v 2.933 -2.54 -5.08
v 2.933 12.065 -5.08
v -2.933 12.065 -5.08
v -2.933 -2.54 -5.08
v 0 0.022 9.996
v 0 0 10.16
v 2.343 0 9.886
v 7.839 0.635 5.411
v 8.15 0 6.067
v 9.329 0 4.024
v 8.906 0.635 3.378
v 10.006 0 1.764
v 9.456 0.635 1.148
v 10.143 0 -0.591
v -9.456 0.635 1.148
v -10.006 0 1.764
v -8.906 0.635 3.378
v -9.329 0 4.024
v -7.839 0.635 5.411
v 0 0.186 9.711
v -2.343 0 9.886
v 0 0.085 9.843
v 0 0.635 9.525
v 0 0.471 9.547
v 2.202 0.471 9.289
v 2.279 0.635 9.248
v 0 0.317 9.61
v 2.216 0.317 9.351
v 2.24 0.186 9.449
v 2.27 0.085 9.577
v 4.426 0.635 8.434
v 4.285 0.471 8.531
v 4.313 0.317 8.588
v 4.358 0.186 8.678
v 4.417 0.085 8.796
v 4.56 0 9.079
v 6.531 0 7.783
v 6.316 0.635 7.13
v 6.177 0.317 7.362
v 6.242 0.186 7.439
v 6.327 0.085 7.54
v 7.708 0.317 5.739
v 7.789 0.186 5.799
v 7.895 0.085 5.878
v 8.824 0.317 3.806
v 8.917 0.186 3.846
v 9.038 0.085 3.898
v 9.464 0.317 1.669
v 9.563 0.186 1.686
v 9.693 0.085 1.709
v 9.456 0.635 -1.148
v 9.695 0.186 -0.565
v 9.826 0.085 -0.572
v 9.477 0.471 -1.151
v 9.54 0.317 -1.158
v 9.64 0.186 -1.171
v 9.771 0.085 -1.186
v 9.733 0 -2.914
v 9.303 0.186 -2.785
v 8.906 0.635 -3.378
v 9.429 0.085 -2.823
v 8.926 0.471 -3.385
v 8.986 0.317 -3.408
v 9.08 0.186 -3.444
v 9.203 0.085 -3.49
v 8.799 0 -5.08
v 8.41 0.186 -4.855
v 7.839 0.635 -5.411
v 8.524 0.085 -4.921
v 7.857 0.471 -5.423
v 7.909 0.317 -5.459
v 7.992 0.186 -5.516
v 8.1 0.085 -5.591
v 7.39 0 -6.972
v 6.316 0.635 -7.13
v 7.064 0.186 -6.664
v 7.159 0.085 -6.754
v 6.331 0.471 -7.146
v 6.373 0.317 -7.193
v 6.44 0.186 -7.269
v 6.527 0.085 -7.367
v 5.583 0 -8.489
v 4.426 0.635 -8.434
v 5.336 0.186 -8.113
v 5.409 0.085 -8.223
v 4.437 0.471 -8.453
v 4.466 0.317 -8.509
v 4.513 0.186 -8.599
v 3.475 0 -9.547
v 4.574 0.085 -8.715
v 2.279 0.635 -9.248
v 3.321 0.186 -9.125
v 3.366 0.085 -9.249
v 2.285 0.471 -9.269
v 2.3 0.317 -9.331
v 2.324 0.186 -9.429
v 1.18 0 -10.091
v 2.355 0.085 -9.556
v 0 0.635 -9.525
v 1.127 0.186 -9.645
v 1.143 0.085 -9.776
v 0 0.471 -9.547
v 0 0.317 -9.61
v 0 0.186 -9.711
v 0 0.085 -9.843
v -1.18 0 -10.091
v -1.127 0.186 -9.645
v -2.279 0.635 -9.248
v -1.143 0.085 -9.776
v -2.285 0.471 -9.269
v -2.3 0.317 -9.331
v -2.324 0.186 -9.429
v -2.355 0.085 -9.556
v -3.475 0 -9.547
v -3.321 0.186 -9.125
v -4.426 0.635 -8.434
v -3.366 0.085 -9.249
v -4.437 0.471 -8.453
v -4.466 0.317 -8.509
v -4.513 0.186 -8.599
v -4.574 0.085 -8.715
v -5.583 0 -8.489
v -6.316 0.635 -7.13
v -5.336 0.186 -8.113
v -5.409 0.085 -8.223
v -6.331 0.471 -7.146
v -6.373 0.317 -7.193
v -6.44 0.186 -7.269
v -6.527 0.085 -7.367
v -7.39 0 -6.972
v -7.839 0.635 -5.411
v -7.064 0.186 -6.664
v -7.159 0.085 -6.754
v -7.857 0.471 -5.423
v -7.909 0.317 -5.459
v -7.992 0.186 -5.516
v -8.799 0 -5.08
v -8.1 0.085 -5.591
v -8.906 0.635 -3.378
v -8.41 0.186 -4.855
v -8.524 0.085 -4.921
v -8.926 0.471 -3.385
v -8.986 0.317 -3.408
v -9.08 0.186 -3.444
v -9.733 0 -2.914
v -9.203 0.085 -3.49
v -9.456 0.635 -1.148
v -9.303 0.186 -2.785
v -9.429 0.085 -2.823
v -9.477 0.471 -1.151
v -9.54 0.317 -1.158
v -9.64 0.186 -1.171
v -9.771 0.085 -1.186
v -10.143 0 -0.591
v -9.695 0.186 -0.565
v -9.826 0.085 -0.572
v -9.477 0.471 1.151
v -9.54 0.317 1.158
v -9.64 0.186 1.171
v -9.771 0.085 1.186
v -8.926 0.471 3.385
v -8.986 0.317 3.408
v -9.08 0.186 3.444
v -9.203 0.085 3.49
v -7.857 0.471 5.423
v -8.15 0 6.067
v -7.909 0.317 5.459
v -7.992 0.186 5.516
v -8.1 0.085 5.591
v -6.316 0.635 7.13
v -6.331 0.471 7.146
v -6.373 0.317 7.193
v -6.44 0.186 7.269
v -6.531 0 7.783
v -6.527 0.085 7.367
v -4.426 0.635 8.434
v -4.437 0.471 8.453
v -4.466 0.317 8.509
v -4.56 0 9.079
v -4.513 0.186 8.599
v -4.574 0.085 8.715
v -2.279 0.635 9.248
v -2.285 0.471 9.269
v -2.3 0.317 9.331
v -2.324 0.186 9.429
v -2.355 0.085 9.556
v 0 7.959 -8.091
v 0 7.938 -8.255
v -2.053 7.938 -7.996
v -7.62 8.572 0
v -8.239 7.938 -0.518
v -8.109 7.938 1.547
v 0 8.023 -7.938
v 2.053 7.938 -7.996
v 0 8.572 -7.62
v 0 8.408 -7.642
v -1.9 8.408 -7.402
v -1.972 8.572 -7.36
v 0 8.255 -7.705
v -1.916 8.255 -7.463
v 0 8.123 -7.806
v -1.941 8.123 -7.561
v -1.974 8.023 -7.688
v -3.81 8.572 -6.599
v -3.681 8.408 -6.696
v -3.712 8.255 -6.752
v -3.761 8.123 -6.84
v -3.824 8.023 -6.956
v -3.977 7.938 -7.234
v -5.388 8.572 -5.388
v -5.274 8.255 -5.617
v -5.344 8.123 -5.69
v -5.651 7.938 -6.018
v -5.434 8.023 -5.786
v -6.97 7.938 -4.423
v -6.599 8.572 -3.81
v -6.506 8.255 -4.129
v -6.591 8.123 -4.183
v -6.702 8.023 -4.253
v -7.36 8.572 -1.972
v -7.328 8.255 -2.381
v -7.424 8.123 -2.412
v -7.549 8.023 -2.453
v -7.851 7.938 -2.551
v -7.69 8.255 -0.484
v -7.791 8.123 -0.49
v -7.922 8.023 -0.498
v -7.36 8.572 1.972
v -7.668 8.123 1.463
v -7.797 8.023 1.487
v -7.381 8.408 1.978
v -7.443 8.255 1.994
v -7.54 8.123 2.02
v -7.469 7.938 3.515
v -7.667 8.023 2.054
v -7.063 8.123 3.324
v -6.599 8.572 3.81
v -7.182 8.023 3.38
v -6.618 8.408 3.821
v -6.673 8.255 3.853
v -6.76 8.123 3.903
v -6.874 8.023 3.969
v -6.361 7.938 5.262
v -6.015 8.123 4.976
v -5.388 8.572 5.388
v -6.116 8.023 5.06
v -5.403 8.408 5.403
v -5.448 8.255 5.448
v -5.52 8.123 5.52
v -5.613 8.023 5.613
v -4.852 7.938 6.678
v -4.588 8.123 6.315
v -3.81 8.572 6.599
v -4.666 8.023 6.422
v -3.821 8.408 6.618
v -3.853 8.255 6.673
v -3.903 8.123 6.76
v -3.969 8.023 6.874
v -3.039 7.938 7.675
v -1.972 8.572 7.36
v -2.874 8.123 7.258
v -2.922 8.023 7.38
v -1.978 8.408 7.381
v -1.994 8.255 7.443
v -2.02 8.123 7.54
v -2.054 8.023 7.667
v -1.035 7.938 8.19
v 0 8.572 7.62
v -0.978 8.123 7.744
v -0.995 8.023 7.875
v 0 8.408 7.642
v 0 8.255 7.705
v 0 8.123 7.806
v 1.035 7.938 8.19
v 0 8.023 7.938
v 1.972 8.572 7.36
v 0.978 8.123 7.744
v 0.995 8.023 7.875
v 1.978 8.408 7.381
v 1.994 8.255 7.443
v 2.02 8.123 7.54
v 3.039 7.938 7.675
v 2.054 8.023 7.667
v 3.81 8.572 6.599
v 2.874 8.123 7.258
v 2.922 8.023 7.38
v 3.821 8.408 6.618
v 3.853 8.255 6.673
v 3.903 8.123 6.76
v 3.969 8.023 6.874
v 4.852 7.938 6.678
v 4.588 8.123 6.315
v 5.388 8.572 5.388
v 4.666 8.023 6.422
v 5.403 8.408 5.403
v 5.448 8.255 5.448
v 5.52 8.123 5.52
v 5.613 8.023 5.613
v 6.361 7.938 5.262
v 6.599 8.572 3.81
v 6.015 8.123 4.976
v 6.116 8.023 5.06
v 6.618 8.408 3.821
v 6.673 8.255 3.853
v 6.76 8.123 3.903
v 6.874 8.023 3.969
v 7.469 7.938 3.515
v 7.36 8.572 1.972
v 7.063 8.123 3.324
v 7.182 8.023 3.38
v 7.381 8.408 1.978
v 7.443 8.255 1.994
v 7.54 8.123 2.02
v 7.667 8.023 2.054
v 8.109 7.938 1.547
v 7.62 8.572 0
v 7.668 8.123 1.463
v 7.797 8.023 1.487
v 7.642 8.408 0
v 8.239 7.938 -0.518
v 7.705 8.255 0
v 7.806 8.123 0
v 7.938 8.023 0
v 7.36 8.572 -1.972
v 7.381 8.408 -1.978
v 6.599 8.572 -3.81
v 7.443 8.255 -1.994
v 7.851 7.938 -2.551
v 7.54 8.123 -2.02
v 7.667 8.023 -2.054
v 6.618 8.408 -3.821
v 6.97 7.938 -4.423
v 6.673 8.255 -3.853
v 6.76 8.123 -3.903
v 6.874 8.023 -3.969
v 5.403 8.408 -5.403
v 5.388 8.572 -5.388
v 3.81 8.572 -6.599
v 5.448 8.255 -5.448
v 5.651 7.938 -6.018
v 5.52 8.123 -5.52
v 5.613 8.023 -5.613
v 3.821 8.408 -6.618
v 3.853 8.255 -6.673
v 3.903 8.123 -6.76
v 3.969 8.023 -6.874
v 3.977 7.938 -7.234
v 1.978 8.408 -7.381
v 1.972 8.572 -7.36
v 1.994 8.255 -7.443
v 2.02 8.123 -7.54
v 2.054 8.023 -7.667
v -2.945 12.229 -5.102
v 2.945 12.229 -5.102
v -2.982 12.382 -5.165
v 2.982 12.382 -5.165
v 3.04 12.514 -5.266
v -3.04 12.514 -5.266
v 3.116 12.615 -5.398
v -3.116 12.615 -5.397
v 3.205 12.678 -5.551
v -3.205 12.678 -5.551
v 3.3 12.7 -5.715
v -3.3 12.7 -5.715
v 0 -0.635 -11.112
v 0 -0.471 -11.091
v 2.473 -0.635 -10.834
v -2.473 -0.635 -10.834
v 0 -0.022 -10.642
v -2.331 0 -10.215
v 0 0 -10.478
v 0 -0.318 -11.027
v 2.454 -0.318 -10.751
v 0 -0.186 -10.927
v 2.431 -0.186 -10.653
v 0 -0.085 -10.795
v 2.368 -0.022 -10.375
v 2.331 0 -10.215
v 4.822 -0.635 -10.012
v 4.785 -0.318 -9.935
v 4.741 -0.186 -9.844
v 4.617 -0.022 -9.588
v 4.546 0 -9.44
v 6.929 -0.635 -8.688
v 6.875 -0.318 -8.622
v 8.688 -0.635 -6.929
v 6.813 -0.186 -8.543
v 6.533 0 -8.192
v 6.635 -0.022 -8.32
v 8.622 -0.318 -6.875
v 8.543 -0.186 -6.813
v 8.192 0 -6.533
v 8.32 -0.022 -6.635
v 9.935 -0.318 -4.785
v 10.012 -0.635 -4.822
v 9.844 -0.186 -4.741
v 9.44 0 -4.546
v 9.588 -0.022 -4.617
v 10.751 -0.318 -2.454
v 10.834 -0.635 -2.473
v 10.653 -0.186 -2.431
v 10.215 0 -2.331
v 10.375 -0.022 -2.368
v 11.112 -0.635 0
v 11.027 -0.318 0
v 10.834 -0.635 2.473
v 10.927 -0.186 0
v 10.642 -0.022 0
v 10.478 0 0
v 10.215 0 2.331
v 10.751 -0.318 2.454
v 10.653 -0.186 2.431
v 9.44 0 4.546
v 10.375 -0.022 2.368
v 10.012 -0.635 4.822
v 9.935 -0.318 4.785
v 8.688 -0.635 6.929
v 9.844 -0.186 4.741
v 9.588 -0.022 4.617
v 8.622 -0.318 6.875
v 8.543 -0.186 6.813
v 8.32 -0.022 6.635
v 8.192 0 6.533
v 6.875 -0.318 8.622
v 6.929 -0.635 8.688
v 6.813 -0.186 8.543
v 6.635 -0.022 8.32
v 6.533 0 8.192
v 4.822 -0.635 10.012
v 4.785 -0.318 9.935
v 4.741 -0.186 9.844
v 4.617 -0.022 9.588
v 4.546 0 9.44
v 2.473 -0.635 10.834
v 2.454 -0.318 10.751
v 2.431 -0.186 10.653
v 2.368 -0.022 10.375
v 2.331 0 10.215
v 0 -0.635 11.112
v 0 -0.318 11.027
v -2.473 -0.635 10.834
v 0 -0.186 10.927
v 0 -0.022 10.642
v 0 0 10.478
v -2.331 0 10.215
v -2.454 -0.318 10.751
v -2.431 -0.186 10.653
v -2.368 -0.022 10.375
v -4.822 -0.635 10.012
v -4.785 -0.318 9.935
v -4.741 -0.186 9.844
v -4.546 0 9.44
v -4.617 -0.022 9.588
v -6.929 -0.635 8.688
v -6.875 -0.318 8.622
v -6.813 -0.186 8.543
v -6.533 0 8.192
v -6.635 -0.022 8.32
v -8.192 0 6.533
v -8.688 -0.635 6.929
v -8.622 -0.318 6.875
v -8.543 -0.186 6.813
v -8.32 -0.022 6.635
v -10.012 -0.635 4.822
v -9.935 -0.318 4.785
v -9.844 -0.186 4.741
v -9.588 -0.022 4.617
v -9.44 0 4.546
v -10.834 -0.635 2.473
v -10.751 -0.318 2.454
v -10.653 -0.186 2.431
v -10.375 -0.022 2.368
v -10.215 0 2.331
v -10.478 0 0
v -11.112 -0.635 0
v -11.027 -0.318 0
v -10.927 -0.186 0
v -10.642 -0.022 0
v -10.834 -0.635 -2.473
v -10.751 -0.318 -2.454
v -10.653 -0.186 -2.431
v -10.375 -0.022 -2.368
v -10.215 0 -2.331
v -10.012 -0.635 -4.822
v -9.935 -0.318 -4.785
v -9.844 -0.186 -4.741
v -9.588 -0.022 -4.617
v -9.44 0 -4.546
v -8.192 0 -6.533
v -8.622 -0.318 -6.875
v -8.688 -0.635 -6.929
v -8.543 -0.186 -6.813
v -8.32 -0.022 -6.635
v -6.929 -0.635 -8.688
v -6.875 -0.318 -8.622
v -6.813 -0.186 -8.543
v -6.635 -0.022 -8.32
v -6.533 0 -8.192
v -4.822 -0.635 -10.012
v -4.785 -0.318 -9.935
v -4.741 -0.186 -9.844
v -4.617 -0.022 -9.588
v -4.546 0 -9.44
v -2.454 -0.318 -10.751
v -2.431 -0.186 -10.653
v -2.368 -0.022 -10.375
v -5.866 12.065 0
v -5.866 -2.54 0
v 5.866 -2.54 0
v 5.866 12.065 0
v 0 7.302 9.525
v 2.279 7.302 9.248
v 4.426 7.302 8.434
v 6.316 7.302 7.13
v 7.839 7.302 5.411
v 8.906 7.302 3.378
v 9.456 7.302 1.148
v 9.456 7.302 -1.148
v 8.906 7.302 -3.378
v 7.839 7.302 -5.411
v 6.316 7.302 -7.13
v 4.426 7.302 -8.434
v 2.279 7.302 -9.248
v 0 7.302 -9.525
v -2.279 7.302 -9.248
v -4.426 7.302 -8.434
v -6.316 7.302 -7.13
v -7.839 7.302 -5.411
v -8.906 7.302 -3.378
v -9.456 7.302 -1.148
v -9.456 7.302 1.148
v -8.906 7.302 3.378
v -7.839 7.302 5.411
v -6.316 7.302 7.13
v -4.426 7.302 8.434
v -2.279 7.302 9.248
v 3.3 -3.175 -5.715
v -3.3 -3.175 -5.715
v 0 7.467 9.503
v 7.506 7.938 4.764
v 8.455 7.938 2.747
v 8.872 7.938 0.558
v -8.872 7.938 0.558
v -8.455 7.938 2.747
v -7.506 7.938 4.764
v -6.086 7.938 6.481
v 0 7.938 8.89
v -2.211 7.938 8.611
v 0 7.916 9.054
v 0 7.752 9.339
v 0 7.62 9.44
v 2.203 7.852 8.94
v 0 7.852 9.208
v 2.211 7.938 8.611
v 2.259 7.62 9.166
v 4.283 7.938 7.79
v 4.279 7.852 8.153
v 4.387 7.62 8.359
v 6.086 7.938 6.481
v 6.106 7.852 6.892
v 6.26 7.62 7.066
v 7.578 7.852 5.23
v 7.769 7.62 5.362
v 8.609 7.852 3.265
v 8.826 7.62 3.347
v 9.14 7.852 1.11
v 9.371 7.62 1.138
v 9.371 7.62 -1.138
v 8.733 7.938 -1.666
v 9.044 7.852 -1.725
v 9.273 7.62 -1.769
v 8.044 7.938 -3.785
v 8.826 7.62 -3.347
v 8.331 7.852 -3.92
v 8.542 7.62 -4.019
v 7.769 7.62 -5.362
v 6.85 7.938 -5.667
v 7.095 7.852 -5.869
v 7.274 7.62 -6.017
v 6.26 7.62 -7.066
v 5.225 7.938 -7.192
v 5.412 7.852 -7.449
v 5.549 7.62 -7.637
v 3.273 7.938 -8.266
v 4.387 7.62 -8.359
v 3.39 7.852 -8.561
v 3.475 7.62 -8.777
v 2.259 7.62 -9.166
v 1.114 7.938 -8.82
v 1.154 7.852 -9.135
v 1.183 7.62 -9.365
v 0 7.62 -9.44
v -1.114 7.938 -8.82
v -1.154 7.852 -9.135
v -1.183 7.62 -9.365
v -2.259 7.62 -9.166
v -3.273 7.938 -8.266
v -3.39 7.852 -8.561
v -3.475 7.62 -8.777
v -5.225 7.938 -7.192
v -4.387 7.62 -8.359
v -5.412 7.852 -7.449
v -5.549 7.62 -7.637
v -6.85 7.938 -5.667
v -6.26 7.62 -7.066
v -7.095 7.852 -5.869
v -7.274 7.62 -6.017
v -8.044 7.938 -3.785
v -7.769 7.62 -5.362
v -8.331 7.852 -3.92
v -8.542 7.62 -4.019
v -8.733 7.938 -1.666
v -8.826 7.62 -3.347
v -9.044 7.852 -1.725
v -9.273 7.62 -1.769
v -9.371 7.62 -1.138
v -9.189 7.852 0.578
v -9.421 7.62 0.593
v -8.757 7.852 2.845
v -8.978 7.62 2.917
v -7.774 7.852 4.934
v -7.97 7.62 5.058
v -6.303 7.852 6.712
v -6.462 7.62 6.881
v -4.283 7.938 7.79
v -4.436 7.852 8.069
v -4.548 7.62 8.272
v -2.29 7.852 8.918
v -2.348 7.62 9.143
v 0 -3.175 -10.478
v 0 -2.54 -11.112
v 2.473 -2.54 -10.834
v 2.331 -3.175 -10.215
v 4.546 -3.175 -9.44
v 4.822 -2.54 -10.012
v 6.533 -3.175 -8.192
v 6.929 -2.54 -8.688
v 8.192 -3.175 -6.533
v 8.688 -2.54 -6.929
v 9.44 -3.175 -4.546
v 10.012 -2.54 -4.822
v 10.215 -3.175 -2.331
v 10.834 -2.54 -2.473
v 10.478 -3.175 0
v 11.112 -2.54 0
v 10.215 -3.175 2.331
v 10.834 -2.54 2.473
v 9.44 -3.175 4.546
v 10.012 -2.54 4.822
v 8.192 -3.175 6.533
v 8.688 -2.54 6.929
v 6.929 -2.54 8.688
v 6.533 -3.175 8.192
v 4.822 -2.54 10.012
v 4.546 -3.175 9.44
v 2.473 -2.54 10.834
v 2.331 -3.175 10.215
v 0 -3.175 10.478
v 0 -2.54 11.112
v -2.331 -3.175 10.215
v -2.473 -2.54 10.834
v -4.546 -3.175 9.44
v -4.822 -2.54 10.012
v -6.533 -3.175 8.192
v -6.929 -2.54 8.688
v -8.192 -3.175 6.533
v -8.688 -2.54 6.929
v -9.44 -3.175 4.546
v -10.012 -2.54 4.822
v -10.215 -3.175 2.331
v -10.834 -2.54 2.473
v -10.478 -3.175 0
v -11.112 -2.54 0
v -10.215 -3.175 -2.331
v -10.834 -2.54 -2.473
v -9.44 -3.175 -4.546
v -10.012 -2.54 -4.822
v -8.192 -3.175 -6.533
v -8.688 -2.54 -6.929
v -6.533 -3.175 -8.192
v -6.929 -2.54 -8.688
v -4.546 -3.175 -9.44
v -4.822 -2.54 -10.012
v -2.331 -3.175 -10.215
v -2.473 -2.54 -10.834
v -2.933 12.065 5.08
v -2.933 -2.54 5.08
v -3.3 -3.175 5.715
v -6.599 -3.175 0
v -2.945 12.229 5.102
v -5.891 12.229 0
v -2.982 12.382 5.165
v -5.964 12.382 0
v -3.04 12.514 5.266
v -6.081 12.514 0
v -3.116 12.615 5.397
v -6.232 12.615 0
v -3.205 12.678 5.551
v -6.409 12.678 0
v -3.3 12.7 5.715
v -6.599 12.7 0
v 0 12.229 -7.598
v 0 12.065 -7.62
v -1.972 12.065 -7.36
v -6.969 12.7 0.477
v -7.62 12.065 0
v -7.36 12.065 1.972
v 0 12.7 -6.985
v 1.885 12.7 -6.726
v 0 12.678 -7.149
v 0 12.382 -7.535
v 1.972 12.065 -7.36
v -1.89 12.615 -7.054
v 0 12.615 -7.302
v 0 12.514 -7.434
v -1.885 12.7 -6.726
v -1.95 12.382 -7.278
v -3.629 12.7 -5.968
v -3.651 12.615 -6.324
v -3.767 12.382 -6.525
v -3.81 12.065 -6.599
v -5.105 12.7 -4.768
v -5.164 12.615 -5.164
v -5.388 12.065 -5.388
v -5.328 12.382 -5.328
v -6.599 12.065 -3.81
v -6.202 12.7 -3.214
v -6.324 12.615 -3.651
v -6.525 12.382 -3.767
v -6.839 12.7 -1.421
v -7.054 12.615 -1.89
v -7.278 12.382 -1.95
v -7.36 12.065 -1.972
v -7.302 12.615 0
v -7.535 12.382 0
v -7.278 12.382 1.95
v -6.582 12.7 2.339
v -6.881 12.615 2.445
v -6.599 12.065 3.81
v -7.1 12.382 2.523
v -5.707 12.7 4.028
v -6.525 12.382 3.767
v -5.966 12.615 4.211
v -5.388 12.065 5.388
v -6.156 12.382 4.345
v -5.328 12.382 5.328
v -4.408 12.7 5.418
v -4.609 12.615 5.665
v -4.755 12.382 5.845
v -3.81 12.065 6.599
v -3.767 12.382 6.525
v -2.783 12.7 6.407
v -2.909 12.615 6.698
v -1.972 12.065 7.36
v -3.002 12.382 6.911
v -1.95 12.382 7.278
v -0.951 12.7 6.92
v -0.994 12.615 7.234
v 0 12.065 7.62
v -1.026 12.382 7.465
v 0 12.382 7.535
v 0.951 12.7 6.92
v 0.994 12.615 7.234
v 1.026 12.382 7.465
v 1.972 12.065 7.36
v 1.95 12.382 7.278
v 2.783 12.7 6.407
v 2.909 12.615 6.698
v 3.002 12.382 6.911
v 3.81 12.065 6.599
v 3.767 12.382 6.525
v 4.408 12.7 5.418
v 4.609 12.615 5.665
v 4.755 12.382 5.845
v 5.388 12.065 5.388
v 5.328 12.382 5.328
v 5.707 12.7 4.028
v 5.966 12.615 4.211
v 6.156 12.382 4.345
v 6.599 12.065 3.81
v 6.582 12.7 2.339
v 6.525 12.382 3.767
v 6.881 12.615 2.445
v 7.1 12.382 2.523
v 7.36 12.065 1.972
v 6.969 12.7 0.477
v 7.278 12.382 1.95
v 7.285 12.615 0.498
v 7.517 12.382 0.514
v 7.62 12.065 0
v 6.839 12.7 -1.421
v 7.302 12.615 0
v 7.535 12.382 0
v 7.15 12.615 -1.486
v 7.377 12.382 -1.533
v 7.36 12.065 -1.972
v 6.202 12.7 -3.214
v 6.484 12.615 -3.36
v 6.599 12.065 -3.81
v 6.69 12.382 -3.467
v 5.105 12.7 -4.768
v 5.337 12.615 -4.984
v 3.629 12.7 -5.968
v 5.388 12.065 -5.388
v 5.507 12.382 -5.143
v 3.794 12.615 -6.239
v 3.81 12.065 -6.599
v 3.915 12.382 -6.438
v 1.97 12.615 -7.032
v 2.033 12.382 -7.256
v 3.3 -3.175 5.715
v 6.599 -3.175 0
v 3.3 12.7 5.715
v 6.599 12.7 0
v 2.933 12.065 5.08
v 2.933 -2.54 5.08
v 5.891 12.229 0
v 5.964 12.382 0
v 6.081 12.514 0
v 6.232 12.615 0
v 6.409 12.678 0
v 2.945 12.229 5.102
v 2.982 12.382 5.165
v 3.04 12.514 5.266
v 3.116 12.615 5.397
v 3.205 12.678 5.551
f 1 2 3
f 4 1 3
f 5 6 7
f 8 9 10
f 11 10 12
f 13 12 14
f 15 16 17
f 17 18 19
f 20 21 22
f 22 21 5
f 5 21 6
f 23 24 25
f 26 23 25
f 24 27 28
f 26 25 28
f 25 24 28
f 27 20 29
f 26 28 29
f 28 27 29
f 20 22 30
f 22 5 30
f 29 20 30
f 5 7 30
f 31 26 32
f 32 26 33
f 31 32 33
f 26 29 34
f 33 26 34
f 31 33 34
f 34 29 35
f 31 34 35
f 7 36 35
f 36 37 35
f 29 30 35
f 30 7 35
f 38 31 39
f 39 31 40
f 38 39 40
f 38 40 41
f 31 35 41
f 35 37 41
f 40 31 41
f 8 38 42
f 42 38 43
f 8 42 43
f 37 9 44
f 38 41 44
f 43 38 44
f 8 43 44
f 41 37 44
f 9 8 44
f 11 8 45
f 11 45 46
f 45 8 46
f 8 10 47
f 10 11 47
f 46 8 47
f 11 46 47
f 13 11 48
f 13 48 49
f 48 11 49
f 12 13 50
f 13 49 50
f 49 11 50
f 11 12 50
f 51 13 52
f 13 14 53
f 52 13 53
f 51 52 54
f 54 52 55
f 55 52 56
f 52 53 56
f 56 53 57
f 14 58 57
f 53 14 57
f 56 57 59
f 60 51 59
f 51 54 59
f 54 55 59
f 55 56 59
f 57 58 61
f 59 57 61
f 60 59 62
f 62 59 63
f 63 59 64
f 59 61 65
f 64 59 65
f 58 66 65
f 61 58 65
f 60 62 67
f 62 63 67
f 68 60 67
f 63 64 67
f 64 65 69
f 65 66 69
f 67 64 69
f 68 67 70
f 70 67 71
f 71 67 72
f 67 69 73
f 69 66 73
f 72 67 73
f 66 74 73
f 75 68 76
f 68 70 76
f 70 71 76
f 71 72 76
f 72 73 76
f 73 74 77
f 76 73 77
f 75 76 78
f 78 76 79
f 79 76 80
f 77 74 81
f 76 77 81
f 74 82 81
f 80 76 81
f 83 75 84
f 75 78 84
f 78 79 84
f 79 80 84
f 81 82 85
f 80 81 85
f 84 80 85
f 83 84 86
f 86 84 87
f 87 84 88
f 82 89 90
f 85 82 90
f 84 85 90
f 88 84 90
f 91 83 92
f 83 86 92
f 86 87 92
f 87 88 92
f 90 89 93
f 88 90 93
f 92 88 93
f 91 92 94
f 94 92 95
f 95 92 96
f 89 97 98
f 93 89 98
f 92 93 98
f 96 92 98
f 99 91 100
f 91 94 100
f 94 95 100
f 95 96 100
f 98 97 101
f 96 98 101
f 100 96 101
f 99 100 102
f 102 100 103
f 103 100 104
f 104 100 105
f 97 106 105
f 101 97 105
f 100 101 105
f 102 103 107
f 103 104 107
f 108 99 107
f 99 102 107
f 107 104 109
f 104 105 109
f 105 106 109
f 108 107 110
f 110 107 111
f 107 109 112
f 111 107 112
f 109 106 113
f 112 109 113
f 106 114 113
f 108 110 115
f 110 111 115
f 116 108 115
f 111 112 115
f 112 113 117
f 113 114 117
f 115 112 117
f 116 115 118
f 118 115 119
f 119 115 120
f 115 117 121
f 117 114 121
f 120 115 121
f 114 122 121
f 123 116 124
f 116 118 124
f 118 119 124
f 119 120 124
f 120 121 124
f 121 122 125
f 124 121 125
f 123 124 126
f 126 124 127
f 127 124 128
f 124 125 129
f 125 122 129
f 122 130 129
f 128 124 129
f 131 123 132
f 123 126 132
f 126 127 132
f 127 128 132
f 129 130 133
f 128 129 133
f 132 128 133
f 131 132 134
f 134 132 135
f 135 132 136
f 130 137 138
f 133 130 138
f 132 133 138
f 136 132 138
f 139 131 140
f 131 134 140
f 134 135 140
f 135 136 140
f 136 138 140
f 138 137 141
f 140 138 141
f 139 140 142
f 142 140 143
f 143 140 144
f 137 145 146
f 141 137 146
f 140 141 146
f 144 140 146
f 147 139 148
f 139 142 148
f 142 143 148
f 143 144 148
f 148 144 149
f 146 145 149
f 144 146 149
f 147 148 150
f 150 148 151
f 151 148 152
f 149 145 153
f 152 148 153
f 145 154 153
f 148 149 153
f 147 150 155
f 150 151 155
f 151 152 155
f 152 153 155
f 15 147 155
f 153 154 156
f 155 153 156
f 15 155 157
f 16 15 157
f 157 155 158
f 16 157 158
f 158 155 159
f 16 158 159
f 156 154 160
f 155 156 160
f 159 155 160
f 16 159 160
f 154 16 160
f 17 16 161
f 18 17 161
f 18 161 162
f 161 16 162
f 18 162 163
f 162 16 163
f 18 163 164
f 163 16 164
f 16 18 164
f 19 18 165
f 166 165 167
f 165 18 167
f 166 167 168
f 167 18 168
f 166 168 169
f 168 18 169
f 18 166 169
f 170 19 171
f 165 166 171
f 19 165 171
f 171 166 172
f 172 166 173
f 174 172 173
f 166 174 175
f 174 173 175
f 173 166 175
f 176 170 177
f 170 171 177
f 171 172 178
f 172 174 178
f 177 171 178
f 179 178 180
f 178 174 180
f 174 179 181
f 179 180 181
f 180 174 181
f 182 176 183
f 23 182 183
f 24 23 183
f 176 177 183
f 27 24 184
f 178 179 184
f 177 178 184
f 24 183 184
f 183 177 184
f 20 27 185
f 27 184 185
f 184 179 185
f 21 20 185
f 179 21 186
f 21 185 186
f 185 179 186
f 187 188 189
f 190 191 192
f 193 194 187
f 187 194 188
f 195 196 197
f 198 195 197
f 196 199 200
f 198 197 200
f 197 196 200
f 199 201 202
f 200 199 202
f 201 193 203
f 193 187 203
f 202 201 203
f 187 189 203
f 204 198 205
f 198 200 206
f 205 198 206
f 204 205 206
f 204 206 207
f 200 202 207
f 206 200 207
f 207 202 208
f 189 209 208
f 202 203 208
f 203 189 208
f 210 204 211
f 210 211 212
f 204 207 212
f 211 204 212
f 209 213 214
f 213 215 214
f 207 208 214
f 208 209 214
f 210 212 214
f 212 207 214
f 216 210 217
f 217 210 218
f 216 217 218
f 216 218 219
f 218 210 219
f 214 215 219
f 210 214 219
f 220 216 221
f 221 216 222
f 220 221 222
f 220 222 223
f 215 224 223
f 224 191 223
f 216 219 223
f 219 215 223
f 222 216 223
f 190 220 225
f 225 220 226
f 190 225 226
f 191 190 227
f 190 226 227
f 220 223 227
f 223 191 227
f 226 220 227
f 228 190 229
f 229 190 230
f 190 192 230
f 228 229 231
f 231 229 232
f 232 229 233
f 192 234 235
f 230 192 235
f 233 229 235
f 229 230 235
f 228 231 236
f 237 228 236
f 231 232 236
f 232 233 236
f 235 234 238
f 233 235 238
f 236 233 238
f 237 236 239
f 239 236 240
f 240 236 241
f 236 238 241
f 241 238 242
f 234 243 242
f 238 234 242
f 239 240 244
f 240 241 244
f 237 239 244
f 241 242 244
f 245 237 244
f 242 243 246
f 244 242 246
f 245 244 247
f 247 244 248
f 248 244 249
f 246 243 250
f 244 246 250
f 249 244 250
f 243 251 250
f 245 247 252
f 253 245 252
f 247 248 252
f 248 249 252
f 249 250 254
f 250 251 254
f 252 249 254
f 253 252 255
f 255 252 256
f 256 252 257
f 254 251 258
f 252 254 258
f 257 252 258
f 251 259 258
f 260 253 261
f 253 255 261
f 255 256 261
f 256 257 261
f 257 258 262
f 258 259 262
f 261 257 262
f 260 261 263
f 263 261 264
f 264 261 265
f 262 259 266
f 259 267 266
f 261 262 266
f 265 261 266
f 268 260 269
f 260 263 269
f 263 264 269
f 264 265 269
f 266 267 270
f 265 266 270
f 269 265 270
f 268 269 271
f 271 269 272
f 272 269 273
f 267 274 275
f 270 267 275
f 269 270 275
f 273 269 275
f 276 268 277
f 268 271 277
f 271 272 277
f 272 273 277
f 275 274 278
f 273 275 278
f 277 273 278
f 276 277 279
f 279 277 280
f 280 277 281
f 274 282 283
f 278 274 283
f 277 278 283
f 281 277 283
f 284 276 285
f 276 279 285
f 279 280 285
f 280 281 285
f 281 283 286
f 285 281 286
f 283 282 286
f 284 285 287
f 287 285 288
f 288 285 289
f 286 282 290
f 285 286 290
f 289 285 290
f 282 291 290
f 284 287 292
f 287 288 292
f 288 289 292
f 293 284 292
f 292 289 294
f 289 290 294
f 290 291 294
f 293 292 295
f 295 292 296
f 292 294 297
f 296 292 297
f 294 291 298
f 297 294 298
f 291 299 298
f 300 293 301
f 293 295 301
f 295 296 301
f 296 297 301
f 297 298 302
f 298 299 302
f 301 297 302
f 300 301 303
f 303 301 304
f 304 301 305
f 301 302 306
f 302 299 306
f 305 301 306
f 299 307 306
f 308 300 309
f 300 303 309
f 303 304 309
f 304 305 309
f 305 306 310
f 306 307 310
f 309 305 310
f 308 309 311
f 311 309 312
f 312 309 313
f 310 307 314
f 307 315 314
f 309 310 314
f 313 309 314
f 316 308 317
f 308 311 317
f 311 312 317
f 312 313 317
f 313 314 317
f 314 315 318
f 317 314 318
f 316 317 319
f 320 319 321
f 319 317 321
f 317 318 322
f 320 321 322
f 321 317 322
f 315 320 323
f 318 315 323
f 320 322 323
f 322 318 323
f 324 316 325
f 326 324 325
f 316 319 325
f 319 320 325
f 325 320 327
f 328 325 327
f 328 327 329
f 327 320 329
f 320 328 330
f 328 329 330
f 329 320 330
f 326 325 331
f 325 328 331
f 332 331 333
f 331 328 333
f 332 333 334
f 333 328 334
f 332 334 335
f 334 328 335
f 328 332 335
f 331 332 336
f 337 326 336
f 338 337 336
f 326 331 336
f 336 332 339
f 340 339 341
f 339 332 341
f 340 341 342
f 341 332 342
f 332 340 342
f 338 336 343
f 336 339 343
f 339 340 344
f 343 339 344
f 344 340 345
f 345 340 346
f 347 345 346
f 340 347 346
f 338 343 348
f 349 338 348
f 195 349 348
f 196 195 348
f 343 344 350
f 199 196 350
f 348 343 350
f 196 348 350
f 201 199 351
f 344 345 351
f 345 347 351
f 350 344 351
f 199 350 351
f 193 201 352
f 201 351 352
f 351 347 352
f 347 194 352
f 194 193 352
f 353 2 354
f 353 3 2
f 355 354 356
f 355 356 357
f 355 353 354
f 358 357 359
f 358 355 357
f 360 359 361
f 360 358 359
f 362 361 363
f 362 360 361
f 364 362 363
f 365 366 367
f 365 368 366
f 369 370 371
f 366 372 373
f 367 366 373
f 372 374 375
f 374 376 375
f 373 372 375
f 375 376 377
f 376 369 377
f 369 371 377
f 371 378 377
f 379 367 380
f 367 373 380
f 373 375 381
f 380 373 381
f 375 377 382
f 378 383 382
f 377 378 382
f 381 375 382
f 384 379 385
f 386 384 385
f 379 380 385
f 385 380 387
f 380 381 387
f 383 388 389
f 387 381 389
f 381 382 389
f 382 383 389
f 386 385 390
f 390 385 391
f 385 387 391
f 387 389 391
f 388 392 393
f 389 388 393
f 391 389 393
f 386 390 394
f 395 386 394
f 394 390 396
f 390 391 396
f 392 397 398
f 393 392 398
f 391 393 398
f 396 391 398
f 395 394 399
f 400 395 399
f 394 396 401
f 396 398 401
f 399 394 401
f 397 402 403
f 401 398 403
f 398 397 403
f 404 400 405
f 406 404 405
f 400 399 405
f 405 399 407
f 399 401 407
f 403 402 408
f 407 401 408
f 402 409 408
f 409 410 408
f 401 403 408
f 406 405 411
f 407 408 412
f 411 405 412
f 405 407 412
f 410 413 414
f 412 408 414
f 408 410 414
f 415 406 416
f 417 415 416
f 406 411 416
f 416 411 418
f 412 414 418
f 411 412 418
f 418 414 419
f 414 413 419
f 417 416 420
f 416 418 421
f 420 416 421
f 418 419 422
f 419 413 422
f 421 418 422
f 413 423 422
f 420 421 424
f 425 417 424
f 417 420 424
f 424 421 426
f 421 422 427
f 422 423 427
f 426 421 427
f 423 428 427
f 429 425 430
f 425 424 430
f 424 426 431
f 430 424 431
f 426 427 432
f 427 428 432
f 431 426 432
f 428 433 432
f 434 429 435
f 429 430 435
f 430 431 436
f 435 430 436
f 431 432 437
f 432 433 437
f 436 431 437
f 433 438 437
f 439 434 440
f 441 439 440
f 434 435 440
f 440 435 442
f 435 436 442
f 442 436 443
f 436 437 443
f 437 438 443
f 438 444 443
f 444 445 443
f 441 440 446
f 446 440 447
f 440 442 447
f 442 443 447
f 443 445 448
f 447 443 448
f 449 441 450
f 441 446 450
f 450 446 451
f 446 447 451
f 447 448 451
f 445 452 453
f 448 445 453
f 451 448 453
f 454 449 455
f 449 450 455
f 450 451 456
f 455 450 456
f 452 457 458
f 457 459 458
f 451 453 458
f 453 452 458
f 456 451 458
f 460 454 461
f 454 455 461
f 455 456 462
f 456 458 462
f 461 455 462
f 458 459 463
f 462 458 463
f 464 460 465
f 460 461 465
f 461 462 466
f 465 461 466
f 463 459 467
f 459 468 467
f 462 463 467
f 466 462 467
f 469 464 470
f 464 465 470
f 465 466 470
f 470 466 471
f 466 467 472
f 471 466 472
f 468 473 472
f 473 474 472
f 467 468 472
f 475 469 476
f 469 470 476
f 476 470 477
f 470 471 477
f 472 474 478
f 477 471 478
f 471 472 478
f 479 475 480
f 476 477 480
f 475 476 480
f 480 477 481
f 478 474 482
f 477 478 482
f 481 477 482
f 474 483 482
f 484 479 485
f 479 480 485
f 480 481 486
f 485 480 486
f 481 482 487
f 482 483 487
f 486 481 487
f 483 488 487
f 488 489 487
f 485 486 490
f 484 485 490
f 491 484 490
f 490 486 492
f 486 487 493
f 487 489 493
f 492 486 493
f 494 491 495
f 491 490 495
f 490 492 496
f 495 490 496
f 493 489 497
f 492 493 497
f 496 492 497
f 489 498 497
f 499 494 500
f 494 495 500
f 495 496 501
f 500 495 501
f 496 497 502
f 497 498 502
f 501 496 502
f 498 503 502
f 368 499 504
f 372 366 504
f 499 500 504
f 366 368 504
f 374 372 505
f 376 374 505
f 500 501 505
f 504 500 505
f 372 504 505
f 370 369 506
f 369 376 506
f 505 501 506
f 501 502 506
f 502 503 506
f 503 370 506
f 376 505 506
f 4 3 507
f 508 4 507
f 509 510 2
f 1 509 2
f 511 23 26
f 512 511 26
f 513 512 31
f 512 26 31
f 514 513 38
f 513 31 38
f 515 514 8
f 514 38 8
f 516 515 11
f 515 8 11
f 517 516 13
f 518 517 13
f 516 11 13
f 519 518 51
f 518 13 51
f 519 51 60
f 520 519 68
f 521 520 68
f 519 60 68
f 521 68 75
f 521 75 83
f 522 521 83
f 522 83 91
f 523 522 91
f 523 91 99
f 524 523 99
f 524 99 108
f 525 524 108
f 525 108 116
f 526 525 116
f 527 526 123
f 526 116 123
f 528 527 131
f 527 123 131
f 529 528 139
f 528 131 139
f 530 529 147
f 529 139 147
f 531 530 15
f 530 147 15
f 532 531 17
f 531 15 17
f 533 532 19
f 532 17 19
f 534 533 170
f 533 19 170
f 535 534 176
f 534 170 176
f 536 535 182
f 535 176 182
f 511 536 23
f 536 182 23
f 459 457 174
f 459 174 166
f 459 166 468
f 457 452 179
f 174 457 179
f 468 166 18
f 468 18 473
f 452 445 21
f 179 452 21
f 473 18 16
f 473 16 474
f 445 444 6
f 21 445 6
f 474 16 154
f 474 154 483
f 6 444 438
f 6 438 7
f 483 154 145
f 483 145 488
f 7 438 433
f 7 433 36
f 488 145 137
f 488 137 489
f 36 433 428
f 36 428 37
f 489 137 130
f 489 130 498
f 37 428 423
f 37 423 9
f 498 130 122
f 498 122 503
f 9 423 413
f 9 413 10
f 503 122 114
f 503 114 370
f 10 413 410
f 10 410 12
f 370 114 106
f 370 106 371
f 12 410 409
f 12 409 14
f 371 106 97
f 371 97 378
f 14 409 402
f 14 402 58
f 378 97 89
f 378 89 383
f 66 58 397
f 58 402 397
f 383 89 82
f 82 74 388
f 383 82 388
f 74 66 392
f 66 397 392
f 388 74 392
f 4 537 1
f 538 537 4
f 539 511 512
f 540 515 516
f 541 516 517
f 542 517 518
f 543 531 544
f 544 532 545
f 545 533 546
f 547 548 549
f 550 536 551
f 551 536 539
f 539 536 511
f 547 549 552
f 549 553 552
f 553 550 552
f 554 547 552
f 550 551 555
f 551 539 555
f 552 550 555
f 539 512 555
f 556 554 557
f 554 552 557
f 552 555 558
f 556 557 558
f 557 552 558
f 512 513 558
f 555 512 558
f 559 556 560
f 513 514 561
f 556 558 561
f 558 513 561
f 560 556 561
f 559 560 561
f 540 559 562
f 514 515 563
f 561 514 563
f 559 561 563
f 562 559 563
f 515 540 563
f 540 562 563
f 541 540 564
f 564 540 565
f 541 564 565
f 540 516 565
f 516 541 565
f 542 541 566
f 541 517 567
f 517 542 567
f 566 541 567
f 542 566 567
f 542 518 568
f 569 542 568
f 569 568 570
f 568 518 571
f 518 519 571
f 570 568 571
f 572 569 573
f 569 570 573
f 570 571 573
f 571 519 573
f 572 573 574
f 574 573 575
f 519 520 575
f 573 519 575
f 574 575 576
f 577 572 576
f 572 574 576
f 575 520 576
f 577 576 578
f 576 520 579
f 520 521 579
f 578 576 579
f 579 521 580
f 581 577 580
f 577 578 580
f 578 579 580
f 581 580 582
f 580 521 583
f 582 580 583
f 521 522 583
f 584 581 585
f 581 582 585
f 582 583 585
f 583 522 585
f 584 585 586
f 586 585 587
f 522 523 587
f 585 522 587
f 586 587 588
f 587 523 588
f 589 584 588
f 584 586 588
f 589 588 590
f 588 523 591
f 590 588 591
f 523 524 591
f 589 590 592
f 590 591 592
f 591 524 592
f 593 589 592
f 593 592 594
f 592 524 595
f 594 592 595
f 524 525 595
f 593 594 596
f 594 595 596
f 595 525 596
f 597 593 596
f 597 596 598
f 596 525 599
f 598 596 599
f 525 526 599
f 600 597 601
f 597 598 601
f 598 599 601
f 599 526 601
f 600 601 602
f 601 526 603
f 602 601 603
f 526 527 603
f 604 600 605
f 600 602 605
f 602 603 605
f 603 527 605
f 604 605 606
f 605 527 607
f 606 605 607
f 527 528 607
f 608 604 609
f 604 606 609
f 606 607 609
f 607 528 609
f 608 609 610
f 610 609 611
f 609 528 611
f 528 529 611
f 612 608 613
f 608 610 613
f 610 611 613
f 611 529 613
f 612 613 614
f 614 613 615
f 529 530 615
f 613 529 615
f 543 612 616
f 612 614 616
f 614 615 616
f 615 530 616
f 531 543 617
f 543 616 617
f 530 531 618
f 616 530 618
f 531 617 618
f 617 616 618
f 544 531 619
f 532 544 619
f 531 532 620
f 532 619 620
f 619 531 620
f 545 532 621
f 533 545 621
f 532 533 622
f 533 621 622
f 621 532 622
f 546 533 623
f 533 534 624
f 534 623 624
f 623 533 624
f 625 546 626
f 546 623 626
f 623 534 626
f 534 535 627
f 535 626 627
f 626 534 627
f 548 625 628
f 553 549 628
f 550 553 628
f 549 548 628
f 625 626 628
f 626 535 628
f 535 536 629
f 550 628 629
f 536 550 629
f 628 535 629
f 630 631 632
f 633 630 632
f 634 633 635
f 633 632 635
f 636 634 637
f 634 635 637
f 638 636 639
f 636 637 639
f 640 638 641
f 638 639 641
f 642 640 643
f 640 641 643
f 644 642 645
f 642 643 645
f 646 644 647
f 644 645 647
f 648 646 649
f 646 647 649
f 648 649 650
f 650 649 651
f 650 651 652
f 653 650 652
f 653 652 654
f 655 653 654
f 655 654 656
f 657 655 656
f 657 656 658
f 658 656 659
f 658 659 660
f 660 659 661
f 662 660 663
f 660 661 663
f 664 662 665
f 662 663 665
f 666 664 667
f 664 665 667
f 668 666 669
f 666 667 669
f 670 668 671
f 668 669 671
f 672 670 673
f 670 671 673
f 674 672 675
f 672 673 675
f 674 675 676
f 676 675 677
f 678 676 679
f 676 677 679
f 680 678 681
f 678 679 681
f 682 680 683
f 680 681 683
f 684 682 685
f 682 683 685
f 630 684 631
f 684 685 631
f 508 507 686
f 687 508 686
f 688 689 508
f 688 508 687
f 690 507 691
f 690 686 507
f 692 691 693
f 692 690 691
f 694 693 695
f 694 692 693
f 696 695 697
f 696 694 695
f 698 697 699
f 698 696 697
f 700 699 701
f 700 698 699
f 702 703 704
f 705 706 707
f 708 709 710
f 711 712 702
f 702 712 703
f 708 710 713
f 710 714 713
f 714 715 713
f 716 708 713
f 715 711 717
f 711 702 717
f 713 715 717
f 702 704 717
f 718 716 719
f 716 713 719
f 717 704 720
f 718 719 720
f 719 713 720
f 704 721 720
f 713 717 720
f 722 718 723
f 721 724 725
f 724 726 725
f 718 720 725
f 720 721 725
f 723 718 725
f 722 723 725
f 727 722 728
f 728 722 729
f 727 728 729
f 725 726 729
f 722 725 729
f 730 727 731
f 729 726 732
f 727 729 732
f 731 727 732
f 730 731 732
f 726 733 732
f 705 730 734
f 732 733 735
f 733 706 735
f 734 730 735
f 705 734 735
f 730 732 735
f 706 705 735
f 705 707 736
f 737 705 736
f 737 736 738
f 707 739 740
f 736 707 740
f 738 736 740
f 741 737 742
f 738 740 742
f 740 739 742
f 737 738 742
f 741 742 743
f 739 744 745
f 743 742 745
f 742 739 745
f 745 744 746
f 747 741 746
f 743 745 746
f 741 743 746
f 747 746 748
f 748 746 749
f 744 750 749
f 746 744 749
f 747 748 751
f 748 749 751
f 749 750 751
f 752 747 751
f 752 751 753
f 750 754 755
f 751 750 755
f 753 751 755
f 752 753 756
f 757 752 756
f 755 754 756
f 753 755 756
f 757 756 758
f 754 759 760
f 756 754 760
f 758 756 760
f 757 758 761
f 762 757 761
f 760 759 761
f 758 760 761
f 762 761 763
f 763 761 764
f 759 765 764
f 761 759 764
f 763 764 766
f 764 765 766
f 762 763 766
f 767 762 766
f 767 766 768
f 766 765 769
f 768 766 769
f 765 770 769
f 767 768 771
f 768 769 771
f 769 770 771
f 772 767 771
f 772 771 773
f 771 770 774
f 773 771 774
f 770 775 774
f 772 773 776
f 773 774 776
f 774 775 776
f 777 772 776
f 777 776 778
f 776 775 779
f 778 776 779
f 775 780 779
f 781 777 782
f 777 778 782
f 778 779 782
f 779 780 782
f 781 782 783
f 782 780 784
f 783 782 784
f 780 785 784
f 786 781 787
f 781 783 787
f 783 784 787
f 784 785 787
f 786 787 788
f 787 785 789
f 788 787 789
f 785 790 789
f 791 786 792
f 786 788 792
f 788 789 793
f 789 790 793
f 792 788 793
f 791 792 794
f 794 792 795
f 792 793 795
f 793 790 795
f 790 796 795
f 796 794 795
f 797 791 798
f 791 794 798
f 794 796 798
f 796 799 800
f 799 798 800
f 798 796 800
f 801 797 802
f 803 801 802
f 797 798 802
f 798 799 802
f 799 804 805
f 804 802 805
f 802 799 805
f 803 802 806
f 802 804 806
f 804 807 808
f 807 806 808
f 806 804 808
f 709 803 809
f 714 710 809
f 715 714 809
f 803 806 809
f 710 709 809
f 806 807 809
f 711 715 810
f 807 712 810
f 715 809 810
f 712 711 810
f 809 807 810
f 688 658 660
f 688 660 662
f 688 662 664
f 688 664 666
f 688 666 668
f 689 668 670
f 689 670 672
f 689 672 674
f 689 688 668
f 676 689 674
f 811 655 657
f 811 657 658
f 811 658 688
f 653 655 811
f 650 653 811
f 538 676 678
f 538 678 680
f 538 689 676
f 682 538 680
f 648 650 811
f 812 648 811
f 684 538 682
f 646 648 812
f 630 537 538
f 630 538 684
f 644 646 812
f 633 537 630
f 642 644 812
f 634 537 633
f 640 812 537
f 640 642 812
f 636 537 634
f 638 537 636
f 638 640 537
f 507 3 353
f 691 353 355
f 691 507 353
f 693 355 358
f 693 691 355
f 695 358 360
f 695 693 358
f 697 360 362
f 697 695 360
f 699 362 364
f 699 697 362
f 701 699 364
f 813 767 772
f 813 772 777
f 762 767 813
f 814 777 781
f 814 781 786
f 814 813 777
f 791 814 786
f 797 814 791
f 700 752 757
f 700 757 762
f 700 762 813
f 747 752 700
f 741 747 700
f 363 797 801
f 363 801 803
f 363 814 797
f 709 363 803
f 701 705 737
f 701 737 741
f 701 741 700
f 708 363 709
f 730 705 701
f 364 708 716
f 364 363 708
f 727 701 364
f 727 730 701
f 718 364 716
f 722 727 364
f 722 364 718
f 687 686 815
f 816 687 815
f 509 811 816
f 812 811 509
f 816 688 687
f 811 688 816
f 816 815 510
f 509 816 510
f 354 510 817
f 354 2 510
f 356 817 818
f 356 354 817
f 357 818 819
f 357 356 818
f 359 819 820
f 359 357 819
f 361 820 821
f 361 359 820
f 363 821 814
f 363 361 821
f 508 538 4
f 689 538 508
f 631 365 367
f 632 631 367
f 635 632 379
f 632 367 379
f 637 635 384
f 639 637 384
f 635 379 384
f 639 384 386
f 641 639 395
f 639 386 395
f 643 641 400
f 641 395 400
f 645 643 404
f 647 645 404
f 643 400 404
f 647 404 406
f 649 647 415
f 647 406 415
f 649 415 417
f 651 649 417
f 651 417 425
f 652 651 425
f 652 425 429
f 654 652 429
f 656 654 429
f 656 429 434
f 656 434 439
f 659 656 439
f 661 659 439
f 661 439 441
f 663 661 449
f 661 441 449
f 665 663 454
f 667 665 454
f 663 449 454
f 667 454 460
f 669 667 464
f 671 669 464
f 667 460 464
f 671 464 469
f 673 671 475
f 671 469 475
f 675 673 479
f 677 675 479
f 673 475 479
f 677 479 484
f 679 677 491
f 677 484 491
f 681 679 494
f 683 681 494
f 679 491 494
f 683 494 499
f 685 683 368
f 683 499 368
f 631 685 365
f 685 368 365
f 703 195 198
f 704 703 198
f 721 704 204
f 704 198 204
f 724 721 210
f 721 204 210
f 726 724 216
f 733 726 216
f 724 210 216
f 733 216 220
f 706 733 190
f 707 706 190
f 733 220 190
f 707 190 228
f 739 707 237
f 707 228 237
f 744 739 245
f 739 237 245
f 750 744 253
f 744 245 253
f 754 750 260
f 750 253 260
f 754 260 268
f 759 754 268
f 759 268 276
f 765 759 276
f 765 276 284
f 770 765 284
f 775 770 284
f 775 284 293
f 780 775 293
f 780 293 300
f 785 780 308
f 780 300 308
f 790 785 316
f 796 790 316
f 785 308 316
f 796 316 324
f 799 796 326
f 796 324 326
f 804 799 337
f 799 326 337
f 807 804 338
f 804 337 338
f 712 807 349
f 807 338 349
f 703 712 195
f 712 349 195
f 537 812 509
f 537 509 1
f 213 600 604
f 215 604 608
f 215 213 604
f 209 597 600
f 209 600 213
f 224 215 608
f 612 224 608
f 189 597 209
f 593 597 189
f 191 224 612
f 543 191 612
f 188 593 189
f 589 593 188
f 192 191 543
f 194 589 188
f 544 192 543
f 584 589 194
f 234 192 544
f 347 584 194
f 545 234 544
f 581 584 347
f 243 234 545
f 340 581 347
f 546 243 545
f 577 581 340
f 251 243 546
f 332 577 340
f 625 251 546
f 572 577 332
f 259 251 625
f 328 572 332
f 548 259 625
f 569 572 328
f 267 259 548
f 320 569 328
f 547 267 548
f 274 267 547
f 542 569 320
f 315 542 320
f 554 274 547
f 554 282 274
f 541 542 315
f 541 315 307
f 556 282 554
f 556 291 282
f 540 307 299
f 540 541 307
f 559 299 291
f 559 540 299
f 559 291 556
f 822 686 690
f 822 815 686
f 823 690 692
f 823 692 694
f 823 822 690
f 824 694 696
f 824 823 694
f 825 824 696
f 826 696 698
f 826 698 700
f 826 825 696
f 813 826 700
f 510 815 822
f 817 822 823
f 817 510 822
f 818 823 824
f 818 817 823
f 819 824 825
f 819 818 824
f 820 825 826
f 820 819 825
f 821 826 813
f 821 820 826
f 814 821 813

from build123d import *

# Parameters (mm, degrees)
SKETCH1_R           = 9.525
BOSS_EXTRUDE1_DEPTH = 7.9375
SKETCH2_R           = 7.62
BOSS_EXTRUDE2_DEPTH = 4.7625
SKETCH3_R           = 11.1125
BOSS_EXTRUDE3_DEPTH = 3.175
FILLET1_R           = 0.635
FILLET3_R           = 0.635
FILLET4_R           = 0.635
CHAMFER1_SIZE       = 0.635


with BuildPart() as part:
    # Sketch1 → Boss-Extrude1 (new body)
    with BuildSketch(Plane(origin=(0, 0, 0), x_dir=(1, 0, 0), z_dir=(0, 1, 0))):
        with Locations(Location((0, 0, 0), (0, 0, 270))):
            Circle(SKETCH1_R)
        Polygon((5.865878735, 0), (2.932939367, 5.08), (-2.932939367, 5.08), (-5.865878735, 0), (-2.932939367, -5.08), (2.932939367, -5.08), align=None, mode=Mode.SUBTRACT)
    extrude(amount=BOSS_EXTRUDE1_DEPTH)

    # Sketch2 → Boss-Extrude2 (add)
    with BuildSketch(Plane(origin=(0, 7.9375, 0), x_dir=(1, 0, 0), z_dir=(0, 1, 0))):
        with Locations(Location((0, 0, 0), (0, 0, 90))):
            Circle(SKETCH2_R)
        Polygon((-2.932939367, 5.08), (-5.865878735, 0), (-2.932939367, -5.08), (2.932939367, -5.08), (5.865878735, 0), (2.932939367, 5.08), align=None, mode=Mode.SUBTRACT)
    extrude(amount=BOSS_EXTRUDE2_DEPTH)

    # Sketch3 → Boss-Extrude3 (add)
    with BuildSketch(Plane.XZ):
        with Locations(Location((0, 0, 0), (0, 0, 270))):
            Circle(SKETCH3_R)
        Polygon((-2.932939367, 5.08), (2.932939367, 5.08), (5.865878735, 0), (2.932939367, -5.08), (-2.932939367, -5.08), (-5.865878735, 0), align=None, mode=Mode.SUBTRACT)
    extrude(amount=BOSS_EXTRUDE3_DEPTH)

    # Fillet1
    fillet1_edges = [part.edges().sort_by_distance(p)[0] for p in [
        (0, 0, -9.525),
        (0, 0, 11.1125),
    ]]
    fillet(fillet1_edges, radius=FILLET1_R)

    # Fillet3
    fillet3_edges = [part.edges().sort_by_distance(p)[0] for p in [
        (0, 12.7, -5.08),
        (-4.399409051, 12.7, -2.54),
        (-4.399409051, 12.7, 2.54),
        (0, 12.7, 5.08),
        (4.399409051, 12.7, 2.54),
        (4.399409051, 12.7, -2.54),
    ]]
    fillet(fillet3_edges, radius=FILLET3_R)

    # Fillet4
    fillet4_edges = [part.edges().sort_by_distance(p)[0] for p in [
        (0, 12.7, 7.62),
        (0, 7.9375, 7.62),
        (0, 7.9375, -9.525),
    ]]
    fillet(fillet4_edges, radius=FILLET4_R)

    # Chamfer1
    chamfer1_edges = [part.edges().sort_by_distance(p)[0] for p in [
        (0, -3.175, 11.1125),
        (-4.399409051, -3.175, 2.54),
        (-4.399409051, -3.175, -2.54),
        (0, -3.175, -5.08),
        (4.399409051, -3.175, -2.54),
        (4.399409051, -3.175, 2.54),
        (0, -3.175, 5.08),
    ]]
    chamfer(chamfer1_edges, length=CHAMFER1_SIZE)


solid = part.part
